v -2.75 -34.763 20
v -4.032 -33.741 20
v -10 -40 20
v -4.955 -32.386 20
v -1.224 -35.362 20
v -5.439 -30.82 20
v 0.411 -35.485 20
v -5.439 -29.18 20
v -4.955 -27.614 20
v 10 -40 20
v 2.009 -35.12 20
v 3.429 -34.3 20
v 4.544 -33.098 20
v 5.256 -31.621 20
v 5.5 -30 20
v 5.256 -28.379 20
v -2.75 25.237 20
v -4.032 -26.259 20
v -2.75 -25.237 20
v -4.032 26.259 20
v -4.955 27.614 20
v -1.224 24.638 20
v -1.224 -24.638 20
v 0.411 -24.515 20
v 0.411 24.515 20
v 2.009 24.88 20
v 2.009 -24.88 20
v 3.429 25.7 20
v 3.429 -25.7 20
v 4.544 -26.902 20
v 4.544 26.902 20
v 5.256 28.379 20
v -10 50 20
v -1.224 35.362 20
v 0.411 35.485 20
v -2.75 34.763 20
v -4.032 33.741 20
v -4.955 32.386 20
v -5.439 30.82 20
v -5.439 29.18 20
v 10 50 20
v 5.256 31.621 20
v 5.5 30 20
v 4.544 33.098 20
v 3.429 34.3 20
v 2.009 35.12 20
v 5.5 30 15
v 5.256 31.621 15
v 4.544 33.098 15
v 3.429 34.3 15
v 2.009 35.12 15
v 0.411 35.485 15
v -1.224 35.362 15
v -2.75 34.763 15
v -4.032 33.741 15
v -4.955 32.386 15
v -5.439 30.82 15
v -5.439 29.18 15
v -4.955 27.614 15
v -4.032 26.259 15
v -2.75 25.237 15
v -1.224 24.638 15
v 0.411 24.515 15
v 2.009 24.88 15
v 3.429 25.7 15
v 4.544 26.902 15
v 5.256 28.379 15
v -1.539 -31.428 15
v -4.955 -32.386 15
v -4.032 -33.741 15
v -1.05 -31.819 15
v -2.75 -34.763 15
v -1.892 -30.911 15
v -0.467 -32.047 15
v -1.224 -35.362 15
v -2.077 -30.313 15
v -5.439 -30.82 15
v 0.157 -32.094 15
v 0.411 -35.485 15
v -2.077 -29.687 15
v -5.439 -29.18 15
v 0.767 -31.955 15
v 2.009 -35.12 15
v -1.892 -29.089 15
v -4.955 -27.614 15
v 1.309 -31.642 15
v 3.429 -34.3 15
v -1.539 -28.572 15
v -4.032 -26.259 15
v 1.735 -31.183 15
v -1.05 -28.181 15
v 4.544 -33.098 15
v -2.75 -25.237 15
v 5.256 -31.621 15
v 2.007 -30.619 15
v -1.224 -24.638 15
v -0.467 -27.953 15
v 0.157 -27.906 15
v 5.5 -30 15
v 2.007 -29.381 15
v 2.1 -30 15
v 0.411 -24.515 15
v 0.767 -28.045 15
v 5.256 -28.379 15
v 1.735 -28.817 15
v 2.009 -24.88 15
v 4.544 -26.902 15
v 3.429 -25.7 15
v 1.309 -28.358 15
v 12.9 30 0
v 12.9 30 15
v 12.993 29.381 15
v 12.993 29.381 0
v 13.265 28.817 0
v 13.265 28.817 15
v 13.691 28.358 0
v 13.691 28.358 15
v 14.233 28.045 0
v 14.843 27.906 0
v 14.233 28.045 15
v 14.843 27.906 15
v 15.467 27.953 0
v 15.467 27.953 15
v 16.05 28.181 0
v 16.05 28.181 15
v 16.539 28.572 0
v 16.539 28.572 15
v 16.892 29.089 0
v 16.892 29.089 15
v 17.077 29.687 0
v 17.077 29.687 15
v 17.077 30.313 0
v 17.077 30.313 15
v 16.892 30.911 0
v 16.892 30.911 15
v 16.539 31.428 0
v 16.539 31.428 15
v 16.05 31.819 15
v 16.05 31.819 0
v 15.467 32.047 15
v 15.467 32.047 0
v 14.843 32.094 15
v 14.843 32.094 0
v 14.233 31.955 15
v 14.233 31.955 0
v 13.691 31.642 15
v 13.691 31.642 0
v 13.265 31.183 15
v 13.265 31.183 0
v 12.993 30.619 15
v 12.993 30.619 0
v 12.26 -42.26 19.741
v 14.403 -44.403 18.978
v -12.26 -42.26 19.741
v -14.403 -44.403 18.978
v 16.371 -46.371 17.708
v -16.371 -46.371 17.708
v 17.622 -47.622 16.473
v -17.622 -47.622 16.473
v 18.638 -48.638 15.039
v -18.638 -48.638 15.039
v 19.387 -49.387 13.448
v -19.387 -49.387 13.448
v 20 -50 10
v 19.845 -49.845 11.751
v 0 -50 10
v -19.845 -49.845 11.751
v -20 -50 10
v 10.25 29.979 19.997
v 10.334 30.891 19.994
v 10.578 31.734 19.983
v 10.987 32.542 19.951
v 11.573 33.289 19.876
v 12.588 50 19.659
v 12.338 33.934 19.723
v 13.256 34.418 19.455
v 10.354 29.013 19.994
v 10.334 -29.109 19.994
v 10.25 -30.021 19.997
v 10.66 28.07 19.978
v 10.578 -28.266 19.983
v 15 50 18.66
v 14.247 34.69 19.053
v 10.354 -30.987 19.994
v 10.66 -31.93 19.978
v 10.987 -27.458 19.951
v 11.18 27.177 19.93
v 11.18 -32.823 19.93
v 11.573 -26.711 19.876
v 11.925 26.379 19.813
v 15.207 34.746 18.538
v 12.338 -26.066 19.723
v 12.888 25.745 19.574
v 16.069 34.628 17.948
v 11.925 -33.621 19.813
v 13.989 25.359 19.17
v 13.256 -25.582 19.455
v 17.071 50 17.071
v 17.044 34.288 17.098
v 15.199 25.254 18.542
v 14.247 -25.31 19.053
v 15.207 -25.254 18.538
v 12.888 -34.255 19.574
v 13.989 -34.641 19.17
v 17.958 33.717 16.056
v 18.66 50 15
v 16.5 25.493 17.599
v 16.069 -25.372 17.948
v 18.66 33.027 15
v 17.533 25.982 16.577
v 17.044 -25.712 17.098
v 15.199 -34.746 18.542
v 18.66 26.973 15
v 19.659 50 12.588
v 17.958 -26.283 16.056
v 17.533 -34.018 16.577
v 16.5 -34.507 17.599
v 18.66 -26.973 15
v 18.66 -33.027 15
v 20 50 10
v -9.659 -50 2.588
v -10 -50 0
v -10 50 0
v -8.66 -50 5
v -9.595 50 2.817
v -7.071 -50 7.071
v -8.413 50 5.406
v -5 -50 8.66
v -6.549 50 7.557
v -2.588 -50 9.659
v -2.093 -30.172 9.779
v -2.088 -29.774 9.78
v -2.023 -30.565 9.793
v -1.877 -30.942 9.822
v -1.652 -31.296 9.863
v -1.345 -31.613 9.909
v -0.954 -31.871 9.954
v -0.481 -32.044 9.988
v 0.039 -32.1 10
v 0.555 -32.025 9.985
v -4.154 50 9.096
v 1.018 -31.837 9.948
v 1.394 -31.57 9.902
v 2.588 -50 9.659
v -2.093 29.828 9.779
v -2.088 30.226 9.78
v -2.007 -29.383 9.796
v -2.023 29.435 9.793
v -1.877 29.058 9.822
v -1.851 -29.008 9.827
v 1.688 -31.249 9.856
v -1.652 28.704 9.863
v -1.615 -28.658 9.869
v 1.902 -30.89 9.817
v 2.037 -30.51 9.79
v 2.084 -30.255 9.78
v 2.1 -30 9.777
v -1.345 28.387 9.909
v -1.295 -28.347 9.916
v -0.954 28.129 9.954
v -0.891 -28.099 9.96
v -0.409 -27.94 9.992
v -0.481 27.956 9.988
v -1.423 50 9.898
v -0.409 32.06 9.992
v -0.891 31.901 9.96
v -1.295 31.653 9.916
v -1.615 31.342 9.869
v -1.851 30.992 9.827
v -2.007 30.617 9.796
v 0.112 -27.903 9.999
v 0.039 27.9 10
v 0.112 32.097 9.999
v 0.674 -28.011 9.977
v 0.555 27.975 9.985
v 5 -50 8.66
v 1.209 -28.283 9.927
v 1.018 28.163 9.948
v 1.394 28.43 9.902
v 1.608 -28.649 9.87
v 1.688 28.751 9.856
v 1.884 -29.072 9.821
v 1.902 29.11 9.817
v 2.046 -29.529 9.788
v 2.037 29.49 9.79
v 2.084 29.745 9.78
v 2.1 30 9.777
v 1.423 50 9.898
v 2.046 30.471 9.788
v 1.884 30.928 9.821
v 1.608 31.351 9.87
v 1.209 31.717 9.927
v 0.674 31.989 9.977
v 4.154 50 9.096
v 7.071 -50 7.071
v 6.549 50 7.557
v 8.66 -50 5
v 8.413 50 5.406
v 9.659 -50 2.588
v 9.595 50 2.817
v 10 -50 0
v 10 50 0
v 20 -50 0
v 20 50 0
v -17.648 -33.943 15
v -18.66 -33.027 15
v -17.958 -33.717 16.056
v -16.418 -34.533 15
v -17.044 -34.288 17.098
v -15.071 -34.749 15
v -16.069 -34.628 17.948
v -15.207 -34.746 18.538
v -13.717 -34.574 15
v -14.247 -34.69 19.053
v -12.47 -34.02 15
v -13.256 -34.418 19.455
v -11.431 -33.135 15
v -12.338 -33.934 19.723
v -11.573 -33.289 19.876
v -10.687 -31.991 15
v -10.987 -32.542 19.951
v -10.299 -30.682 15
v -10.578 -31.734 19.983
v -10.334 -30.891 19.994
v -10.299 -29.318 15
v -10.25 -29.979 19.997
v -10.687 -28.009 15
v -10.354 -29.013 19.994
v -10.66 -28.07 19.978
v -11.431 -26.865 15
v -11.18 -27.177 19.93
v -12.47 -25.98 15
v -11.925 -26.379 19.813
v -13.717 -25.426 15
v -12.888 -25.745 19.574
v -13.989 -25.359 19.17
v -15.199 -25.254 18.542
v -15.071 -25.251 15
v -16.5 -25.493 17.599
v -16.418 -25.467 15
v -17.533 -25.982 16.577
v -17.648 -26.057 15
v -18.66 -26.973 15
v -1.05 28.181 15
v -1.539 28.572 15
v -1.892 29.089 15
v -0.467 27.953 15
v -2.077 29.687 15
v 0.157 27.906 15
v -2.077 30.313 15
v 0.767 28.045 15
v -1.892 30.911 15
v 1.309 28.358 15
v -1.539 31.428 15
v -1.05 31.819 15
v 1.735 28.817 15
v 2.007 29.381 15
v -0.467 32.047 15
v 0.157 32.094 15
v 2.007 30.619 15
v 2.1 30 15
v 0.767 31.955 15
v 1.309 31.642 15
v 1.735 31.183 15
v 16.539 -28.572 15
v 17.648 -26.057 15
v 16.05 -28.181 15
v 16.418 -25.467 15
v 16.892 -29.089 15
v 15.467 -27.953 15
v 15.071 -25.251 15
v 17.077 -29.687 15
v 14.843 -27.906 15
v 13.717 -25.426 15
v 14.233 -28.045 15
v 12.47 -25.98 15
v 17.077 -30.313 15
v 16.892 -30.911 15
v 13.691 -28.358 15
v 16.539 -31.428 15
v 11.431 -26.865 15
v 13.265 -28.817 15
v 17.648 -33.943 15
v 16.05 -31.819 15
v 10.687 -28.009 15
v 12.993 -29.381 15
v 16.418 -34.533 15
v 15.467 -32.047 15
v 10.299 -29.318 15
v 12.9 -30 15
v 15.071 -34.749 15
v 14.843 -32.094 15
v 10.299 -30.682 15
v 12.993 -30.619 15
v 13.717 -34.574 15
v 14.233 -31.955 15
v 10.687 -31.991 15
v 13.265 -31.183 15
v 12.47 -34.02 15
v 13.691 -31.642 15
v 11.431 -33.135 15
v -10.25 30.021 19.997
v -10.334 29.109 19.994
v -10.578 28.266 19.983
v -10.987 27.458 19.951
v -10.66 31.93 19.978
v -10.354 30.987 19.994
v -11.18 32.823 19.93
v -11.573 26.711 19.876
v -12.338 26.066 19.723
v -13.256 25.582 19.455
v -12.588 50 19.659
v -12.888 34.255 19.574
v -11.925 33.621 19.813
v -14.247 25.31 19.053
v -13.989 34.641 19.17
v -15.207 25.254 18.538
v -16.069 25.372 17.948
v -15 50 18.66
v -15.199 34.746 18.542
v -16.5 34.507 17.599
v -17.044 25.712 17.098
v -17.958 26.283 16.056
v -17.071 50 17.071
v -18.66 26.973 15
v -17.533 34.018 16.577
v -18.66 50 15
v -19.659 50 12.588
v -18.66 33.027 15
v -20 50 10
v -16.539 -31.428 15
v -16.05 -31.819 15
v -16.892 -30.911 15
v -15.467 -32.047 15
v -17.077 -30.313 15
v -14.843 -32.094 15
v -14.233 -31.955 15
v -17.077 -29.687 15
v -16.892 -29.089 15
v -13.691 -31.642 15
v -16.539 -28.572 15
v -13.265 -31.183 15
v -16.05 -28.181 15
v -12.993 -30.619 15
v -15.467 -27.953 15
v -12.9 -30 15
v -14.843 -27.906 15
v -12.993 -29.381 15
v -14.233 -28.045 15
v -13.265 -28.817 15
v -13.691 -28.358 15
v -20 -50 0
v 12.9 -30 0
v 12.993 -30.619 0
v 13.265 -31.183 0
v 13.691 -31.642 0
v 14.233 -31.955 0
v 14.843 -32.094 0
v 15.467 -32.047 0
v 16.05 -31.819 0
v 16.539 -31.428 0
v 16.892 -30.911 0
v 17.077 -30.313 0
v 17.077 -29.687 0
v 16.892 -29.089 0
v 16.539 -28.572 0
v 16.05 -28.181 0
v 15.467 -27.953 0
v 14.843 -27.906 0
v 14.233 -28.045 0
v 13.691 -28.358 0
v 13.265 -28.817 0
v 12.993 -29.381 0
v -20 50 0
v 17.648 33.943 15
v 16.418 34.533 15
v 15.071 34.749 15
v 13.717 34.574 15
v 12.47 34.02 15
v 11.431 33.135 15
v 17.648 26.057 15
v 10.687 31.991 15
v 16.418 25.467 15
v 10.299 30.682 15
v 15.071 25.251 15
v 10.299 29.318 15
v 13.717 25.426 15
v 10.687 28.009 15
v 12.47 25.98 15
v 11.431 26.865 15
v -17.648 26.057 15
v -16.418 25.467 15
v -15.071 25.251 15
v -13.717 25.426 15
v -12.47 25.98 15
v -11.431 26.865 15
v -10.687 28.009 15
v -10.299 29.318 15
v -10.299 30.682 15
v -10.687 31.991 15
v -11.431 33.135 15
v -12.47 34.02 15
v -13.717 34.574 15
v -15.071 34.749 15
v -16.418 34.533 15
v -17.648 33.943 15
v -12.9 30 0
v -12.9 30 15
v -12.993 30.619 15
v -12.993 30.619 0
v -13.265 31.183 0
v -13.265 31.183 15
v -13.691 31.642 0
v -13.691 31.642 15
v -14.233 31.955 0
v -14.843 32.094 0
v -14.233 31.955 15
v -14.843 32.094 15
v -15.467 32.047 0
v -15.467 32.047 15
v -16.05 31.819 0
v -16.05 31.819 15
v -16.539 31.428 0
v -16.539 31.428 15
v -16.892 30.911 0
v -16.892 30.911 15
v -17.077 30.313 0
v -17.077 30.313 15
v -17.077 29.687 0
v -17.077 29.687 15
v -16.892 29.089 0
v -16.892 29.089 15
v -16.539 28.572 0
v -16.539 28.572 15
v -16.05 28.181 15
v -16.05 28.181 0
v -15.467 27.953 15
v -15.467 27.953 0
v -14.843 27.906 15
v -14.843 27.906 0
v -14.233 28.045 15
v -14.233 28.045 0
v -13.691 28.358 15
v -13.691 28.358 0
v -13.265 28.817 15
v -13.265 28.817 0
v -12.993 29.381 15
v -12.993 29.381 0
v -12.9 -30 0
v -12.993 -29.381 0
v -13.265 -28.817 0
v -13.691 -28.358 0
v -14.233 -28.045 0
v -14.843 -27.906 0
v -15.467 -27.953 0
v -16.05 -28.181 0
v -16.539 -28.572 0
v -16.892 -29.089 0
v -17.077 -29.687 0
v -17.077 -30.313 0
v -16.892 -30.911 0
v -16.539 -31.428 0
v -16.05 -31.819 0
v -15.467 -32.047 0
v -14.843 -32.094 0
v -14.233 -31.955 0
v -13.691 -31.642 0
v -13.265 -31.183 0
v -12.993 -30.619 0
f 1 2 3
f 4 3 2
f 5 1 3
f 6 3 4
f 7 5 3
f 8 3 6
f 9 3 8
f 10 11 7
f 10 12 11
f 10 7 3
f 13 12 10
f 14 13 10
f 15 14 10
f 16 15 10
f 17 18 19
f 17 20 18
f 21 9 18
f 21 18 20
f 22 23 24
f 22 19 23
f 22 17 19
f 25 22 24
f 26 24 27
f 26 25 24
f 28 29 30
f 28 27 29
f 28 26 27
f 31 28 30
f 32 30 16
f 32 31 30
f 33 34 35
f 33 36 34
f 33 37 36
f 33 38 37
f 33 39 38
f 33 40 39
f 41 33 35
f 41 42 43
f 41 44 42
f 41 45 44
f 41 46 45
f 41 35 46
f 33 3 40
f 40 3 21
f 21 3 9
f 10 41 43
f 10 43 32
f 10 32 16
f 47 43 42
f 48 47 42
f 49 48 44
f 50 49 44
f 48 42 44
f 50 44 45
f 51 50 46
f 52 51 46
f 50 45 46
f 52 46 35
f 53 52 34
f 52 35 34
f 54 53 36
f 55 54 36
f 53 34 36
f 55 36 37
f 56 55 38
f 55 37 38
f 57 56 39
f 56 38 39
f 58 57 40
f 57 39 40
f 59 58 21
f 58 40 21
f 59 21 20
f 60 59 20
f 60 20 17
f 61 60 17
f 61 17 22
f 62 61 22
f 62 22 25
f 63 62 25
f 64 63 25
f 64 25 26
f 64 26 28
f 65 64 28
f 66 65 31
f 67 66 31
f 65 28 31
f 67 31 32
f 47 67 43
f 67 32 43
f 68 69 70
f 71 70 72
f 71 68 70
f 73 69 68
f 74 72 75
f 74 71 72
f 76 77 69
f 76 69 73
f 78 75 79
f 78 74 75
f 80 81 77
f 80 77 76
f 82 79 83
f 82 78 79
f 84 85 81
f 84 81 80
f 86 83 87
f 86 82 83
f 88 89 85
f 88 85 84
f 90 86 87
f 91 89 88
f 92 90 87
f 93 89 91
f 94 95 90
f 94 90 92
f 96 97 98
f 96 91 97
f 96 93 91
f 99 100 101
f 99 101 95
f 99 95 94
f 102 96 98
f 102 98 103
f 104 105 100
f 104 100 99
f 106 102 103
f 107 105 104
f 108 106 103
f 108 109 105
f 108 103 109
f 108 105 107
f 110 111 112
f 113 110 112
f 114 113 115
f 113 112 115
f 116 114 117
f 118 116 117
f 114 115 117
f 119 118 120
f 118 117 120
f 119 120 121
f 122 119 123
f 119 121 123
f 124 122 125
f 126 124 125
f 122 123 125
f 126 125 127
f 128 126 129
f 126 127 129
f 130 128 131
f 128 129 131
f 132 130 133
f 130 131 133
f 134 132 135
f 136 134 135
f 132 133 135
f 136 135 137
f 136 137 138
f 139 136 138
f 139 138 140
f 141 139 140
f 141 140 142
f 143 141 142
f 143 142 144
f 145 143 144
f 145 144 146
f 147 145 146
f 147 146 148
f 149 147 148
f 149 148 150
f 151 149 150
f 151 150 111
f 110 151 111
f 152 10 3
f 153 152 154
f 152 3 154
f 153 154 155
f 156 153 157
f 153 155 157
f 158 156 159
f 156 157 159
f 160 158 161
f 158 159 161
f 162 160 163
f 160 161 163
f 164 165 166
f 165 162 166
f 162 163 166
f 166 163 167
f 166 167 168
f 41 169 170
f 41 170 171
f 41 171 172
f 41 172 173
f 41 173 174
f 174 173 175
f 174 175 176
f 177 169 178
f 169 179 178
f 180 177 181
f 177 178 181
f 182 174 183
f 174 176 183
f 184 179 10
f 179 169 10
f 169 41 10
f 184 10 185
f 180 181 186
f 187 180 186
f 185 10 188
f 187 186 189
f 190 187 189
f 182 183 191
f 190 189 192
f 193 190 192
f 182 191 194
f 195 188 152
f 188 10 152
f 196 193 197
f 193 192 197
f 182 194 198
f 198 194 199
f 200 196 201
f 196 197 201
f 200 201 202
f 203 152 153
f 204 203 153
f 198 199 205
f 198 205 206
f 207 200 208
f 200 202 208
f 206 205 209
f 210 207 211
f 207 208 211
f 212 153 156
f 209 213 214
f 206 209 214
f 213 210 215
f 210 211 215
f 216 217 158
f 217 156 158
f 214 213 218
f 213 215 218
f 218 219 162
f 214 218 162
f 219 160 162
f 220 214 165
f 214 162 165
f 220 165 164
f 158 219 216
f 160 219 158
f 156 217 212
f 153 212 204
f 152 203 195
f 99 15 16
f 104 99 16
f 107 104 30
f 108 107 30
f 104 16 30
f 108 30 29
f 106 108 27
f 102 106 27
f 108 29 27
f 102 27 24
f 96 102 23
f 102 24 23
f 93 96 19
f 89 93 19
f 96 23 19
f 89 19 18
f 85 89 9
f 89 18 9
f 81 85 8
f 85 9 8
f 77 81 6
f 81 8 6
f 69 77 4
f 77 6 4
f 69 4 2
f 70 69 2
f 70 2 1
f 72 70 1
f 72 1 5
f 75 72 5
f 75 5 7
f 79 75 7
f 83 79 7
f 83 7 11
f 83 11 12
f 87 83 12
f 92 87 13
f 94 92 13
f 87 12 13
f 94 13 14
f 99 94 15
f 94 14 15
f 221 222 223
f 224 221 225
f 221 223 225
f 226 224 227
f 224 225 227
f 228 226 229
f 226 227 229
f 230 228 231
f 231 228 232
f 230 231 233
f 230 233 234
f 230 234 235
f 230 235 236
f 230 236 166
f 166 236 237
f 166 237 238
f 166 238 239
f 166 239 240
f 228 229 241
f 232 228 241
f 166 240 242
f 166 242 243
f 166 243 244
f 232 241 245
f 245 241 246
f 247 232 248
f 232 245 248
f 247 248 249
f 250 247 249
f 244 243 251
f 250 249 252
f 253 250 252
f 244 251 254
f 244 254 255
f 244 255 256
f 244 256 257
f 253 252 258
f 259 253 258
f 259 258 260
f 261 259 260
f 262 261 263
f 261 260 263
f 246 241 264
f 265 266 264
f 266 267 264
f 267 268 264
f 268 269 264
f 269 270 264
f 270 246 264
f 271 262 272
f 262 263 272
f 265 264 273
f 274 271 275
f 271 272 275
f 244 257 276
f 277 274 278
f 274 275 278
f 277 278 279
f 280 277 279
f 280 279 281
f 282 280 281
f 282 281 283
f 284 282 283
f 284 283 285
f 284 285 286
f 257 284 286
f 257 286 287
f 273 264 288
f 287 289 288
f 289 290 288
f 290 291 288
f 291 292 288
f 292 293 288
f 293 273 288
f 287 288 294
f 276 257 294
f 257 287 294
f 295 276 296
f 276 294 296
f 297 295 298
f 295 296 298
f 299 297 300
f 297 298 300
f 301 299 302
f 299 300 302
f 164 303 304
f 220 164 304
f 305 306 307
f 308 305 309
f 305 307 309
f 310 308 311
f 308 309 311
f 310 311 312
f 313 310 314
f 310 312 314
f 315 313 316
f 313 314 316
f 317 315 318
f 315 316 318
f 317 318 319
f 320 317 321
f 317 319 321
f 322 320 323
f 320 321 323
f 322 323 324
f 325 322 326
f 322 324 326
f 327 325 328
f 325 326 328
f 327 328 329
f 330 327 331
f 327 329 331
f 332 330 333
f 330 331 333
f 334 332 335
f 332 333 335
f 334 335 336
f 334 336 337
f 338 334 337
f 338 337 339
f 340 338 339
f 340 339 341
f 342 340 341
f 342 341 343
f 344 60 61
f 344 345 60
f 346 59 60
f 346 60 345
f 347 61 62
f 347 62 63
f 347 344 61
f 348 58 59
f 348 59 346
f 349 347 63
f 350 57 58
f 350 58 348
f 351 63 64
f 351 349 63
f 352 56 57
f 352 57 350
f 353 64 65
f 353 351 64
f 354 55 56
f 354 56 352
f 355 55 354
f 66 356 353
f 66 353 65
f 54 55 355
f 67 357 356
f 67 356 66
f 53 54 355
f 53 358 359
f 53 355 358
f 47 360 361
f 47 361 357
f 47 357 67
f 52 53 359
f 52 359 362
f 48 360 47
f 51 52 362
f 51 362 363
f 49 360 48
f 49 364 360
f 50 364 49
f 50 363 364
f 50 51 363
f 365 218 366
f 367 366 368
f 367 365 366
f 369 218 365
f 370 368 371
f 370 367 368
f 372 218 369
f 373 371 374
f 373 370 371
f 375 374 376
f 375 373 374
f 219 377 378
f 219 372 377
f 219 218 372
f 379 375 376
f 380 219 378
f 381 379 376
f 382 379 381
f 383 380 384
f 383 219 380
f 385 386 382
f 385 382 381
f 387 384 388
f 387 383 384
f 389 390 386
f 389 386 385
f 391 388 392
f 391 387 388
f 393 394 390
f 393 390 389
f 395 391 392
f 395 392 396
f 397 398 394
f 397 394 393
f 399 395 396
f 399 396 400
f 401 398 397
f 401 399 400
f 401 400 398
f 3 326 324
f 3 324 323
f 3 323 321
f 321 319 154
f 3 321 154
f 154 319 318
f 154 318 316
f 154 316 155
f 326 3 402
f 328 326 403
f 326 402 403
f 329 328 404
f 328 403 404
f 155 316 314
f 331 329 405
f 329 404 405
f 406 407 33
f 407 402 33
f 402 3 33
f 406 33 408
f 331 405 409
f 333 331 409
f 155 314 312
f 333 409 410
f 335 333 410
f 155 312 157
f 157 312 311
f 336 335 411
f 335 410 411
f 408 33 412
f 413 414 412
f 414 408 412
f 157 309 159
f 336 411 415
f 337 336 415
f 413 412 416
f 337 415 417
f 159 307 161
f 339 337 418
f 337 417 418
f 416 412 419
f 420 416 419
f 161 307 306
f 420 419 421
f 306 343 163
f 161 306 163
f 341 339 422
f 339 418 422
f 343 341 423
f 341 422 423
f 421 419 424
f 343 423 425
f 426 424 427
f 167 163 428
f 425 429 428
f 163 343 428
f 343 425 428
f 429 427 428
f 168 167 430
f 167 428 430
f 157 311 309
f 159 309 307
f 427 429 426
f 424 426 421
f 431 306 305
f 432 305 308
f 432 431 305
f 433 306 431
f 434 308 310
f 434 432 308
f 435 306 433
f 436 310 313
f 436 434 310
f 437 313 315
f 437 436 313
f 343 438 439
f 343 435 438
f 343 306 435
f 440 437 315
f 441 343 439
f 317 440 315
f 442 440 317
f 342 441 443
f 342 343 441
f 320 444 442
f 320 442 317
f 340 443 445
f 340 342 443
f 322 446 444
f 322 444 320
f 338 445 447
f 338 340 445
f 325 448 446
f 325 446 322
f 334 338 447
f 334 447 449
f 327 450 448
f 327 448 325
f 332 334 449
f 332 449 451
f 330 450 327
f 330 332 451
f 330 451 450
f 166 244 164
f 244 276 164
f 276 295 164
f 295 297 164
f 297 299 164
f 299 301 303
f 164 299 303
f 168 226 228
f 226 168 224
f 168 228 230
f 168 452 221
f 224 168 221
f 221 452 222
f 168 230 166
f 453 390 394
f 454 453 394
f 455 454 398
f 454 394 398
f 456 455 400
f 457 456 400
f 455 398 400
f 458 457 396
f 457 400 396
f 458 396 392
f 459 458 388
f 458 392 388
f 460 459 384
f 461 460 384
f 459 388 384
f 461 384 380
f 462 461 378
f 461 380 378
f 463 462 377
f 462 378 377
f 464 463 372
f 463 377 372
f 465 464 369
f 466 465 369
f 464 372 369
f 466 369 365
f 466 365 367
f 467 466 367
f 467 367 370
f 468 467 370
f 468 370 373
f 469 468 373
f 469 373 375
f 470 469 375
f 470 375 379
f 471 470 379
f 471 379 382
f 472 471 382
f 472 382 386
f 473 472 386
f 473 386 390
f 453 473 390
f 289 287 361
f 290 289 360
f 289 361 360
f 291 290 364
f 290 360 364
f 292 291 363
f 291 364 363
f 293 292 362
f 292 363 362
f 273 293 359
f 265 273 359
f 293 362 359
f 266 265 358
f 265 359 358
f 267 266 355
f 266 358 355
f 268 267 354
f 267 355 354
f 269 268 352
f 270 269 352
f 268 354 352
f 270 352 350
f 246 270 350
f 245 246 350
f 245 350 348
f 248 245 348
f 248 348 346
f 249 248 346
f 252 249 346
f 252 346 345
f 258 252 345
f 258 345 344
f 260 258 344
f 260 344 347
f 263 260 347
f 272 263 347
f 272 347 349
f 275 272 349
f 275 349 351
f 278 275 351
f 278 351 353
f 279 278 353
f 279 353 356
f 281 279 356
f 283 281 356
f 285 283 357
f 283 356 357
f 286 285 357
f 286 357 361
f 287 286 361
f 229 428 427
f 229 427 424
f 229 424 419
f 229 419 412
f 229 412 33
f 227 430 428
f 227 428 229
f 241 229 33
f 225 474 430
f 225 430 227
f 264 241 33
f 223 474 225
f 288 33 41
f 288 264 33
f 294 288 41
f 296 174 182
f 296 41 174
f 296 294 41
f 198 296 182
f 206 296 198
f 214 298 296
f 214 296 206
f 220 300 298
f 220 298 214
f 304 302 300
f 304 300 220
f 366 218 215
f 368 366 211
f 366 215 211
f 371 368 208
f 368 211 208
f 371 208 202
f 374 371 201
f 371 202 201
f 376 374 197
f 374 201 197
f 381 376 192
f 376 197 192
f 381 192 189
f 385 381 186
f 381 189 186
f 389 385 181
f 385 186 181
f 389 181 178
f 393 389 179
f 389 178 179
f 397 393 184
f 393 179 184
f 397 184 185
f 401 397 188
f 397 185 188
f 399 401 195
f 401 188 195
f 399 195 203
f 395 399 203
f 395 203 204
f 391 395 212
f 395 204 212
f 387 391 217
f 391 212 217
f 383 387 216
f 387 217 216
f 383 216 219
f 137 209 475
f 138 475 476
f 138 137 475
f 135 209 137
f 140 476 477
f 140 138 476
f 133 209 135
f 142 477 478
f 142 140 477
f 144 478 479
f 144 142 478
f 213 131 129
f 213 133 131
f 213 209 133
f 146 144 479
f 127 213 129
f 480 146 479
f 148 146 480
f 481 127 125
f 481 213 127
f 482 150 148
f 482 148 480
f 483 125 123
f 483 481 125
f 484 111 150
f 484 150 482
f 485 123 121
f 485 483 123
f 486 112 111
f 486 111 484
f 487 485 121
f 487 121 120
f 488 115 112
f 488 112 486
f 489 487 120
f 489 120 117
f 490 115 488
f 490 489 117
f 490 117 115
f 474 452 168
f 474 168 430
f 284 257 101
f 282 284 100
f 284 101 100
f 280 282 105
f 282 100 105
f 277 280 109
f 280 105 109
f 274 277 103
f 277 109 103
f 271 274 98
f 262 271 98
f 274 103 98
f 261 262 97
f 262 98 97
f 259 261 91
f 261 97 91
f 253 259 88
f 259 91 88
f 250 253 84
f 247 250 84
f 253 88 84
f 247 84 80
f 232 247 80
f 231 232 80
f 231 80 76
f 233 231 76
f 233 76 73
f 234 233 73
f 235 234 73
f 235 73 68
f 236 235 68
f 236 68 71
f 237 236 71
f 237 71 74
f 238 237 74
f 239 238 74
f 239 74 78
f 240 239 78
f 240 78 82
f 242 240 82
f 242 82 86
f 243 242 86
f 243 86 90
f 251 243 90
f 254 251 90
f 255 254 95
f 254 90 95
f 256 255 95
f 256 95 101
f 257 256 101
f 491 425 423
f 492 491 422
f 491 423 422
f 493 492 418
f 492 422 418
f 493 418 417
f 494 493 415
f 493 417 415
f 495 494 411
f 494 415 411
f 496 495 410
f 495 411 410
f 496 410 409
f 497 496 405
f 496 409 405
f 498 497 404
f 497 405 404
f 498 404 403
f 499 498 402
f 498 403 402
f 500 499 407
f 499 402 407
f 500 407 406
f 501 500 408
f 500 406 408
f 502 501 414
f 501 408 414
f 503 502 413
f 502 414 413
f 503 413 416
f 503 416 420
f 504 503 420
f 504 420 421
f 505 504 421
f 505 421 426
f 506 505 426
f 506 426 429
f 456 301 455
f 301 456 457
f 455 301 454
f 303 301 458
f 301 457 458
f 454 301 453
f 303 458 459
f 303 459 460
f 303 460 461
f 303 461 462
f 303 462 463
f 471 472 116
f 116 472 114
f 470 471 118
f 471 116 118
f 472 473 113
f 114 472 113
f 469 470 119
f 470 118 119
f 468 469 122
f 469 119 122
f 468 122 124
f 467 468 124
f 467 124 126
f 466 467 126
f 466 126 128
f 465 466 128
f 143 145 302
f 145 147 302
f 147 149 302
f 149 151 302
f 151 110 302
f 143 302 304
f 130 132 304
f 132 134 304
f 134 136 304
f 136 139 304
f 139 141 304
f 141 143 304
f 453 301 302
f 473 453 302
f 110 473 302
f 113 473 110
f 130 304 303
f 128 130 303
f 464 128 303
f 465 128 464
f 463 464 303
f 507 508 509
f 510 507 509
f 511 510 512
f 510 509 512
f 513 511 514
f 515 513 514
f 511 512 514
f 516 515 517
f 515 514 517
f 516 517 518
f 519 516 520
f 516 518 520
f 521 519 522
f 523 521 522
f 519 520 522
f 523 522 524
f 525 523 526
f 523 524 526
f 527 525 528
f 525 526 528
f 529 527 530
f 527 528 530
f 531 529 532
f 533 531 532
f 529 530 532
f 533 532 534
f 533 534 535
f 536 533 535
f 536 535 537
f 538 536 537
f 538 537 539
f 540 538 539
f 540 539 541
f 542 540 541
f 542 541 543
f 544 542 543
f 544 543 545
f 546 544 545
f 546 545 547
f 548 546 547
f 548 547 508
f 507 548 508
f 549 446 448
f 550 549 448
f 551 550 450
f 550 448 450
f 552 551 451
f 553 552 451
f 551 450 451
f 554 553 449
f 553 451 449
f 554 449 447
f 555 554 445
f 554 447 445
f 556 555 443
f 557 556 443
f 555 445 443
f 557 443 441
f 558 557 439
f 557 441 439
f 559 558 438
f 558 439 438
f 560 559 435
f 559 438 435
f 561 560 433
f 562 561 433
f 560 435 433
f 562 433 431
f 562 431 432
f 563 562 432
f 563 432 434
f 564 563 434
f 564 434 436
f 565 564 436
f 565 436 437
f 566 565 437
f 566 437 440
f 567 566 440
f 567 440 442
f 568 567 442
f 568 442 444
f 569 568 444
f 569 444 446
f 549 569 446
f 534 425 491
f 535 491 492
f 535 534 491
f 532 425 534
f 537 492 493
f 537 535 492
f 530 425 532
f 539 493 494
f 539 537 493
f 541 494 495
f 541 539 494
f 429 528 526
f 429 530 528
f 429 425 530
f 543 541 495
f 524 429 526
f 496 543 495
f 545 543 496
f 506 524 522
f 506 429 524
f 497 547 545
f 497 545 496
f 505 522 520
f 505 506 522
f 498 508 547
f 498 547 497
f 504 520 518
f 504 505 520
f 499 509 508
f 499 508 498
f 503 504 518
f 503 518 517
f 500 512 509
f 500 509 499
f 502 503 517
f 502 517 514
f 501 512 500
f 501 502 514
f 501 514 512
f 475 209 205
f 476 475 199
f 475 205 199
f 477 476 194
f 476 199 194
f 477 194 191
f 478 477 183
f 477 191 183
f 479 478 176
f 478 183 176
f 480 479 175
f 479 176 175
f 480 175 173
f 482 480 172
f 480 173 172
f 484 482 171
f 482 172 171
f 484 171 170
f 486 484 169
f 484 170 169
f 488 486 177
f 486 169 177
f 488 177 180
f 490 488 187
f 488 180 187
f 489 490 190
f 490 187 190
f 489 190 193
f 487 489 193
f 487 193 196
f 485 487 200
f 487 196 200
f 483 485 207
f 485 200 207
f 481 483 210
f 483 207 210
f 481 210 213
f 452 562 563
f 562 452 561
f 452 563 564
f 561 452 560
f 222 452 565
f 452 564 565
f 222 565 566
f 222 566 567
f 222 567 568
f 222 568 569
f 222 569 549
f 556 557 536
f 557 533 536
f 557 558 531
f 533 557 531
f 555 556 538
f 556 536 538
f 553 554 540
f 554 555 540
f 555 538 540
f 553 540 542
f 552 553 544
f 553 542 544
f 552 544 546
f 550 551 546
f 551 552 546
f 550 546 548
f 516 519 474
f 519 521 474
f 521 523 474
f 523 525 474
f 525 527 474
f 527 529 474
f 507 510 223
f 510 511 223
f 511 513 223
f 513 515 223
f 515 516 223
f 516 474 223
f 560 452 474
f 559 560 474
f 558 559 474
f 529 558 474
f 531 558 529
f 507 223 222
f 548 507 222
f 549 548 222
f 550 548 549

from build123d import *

# Parameters (mm, degrees)
SKETCH3_W           = 40
SKETCH3_H           = 100
BOSS_EXTRUDE1_DEPTH = 20
SKETCH4_R           = 10
CUT_EXTRUDE1_DEPTH  = 104.923048454
SKETCH6_R           = 5.5
SKETCH6_R_2         = 2.1
SKETCH6_R_3         = 4.75
CUT_EXTRUDE10_DEPTH = 5
SKETCH6_2_R         = 2.1
CUT_EXTRUDE11_DEPTH = 58.445626465
FILLET1_R           = 10


with BuildPart() as part:
    # Sketch3 → Boss-Extrude1 (new body)
    with BuildSketch(Plane.XY):
        Rectangle(SKETCH3_W, SKETCH3_H)
    extrude(amount=BOSS_EXTRUDE1_DEPTH)

    # Sketch4 → Cut-Extrude1 (cut, through all)
    with BuildSketch(Plane(origin=(0, 50, 0), x_dir=(1, 0, 0), z_dir=(0, 1, 0))):
        Circle(SKETCH4_R)
    extrude(amount=-CUT_EXTRUDE1_DEPTH, mode=Mode.SUBTRACT)

    # Sketch6 → Cut-Extrude10 (cut)
    # profile 1 of 6: a face of its own
    with BuildSketch(Plane.XY.offset(20)):
        with Locations((0, 30)):
            Circle(SKETCH6_R)
        with Locations((0, 30)):
            Circle(SKETCH6_R_2, mode=Mode.SUBTRACT)
    # profile 2 of 6: a face of its own
    with BuildSketch(Plane.XY.offset(20)):
        with Locations((0, -30)):
            Circle(SKETCH6_R)
        with Locations((0, -30)):
            Circle(SKETCH6_R_2, mode=Mode.SUBTRACT)
    # profile 3 of 6: a face of its own
    with BuildSketch(Plane.XY.offset(20)):
        with Locations((-15, 30)):
            Circle(SKETCH6_R_3)
        with Locations((-15, 30)):
            Circle(SKETCH6_R_2, mode=Mode.SUBTRACT)
    # profile 4 of 6: a face of its own
    with BuildSketch(Plane.XY.offset(20)):
        with Locations((-15, -30)):
            Circle(SKETCH6_R_3)
        with Locations((-15, -30)):
            Circle(SKETCH6_R_2, mode=Mode.SUBTRACT)
    # profile 5 of 6: a face of its own
    with BuildSketch(Plane.XY.offset(20)):
        with Locations(Location((15, -30, 0), (0, 0, 180))):
            Circle(SKETCH6_R_3)
        with Locations(Location((15, -30, 0), (0, 0, 180))):
            Circle(SKETCH6_R_2, mode=Mode.SUBTRACT)
    # profile 6 of 6: a face of its own
    with BuildSketch(Plane.XY.offset(20)):
        with Locations(Location((15, 30, 0), (0, 0, 180))):
            Circle(SKETCH6_R_3)
        with Locations(Location((15, 30, 0), (0, 0, 180))):
            Circle(SKETCH6_R_2, mode=Mode.SUBTRACT)
    extrude(amount=-CUT_EXTRUDE10_DEPTH, mode=Mode.SUBTRACT)

    # Sketch6<2> → Cut-Extrude11 (cut, through all)
    with BuildSketch(Plane.XY.offset(20)):
        with Locations((0, 30)):
            Circle(SKETCH6_2_R)
        with Locations((0, -30)):
            Circle(SKETCH6_2_R)
        with Locations((-15, 30)):
            Circle(SKETCH6_2_R)
        with Locations((-15, -30)):
            Circle(SKETCH6_2_R)
        with Locations(Location((15, -30, 0), (0, 0, 180))):
            Circle(SKETCH6_2_R)
        with Locations(Location((15, 30, 0), (0, 0, 180))):
            Circle(SKETCH6_2_R)
    extrude(amount=-CUT_EXTRUDE11_DEPTH, mode=Mode.SUBTRACT)

    # Fillet1
    # the kernel refuses this fillet: 10 mm, written as the material it takes off along each edge
    with BuildSketch(Plane(origin=(-45, -50, 20), x_dir=(0, 0, -1), z_dir=(1, 0, 0))) as fillet1_piece_1:
        with BuildLine():
            CenterArc((FILLET1_R, FILLET1_R), FILLET1_R, 180, 90)
            Line((0, FILLET1_R), (0, 0))
            Line((0, 0), (FILLET1_R, 0))
        make_face()
    extrude(amount=90, mode=Mode.SUBTRACT)
    with BuildSketch(Plane(origin=(20, -75, 20), x_dir=(0, 0, -1), z_dir=(0, 1, 0))) as fillet1_piece_2:
        with BuildLine():
            CenterArc((FILLET1_R, FILLET1_R), FILLET1_R, 180, 90)
            Line((0, FILLET1_R), (0, 0))
            Line((0, 0), (FILLET1_R, 0))
        make_face()
    extrude(amount=150, mode=Mode.SUBTRACT)
    with BuildSketch(Plane(origin=(-20, 75, 20), x_dir=(1, 0, 0), z_dir=(0, -1, 0))) as fillet1_piece_3:
        with BuildLine():
            CenterArc((FILLET1_R, -FILLET1_R), FILLET1_R, 90, 90)
            Line((0, -FILLET1_R), (0, 0))
            Line((0, 0), (FILLET1_R, 0))
        make_face()
    extrude(amount=150, mode=Mode.SUBTRACT)


solid = part.part
